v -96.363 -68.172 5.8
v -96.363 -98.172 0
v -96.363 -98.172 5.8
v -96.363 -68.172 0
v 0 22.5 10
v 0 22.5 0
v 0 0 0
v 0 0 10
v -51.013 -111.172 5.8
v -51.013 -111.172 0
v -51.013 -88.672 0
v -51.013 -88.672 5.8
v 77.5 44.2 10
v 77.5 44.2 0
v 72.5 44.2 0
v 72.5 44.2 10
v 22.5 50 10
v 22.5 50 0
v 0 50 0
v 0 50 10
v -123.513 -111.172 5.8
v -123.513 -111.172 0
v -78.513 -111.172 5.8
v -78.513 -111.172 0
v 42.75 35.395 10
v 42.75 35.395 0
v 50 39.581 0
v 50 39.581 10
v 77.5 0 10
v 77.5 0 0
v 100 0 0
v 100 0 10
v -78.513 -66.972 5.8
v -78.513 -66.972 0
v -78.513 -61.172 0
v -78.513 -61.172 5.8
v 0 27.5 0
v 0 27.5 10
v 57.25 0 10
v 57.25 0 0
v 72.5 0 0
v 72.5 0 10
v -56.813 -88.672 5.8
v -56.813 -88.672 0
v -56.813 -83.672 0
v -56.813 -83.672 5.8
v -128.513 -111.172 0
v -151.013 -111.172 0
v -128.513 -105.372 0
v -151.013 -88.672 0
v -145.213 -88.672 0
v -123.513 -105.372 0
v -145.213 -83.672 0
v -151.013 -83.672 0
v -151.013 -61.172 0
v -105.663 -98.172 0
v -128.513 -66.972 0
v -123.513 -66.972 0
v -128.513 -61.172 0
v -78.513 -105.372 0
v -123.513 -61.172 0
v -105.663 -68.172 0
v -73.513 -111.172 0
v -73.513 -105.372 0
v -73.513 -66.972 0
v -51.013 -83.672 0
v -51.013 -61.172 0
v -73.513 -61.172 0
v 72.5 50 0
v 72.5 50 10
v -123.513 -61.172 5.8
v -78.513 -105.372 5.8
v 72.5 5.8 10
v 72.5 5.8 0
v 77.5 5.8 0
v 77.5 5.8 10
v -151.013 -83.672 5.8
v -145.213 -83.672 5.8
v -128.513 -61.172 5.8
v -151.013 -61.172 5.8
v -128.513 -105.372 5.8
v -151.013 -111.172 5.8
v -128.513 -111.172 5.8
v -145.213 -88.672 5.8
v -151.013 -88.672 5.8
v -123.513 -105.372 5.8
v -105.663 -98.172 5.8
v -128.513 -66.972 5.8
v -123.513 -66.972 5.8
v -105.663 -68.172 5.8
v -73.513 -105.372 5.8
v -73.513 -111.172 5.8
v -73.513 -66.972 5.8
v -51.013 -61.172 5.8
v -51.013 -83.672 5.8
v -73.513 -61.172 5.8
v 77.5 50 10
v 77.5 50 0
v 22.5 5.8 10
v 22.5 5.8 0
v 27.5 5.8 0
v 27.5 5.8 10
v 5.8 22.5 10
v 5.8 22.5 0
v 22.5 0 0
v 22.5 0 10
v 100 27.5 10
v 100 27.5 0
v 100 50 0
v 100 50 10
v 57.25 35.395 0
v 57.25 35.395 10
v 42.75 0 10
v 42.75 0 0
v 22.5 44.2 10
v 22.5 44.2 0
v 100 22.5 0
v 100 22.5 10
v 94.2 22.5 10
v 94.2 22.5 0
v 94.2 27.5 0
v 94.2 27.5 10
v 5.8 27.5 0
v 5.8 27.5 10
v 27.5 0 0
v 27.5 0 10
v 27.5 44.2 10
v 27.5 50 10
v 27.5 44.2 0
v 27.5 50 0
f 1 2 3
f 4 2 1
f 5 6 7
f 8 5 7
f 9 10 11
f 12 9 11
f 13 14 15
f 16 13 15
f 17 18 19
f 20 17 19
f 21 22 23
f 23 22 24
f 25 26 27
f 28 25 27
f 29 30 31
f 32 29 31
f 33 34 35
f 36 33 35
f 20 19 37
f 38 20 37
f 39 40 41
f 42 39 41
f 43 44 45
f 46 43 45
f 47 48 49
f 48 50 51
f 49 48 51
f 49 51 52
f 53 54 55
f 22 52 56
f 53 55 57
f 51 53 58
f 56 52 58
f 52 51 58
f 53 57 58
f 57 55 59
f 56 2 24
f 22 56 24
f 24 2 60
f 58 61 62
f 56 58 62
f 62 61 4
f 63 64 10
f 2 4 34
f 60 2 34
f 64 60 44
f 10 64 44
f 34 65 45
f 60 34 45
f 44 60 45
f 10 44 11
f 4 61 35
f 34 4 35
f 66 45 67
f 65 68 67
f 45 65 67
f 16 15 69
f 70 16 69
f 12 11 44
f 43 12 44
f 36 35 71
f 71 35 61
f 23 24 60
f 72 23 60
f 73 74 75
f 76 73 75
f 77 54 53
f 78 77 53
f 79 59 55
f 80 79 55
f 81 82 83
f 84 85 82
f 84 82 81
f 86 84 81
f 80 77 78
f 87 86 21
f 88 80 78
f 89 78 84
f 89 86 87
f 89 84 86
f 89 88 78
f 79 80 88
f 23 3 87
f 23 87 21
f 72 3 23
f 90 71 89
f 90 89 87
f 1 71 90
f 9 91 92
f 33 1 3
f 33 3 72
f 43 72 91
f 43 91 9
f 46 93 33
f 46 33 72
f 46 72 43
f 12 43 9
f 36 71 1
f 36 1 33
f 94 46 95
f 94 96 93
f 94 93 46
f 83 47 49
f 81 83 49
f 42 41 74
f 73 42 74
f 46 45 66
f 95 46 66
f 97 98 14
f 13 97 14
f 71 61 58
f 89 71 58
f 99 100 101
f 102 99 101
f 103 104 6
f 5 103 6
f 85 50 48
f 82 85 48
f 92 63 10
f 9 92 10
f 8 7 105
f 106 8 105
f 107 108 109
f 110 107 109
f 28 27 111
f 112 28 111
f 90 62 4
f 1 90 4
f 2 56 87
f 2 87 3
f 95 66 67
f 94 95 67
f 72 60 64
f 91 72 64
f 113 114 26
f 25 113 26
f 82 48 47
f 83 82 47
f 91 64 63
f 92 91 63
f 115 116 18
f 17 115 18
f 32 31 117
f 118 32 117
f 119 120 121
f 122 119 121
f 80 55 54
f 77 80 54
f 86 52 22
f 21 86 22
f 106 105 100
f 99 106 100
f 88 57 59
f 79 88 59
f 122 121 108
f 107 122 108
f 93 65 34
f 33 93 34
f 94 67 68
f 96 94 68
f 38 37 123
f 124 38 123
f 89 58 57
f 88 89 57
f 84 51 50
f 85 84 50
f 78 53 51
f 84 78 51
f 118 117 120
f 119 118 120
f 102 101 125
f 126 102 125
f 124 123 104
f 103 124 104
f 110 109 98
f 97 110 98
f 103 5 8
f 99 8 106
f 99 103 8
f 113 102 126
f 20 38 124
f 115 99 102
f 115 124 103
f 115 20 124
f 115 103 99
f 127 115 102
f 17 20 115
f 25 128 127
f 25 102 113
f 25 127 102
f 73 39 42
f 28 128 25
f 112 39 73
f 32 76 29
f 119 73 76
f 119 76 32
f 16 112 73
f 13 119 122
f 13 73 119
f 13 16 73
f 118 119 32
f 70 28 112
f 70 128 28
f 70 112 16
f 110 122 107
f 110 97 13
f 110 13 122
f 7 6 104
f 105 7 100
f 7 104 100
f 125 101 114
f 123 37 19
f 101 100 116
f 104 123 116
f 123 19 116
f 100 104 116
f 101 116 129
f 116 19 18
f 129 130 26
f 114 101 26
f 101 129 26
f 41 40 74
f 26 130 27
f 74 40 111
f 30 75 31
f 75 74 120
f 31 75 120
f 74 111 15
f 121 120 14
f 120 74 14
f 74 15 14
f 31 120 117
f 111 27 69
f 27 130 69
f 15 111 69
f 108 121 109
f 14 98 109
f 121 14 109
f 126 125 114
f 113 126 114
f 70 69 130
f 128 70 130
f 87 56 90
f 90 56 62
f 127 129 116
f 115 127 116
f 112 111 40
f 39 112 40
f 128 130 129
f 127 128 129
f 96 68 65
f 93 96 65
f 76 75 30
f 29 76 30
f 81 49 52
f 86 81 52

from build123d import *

# Parameters (mm, degrees)
F2_DEPTH = 10
F3_W     = 9.3
F3_H     = 30
F4_DEPTH = 5.8


with BuildPart() as f2:
    # F1 (on Top) → F2 (new body)
    with BuildSketch(Plane.XY):
        Polygon((0, 22.5), (0, 0), (22.5, 0), (22.5, 5.8), (27.5, 5.8), (27.5, 0), (42.75, 0), (42.75, 35.3950038552), (50, 39.5807933069), (57.25, 35.3950038552), (57.25, 0), (72.5, 0), (72.5, 5.8), (77.5, 5.8), (77.5, 0), (100, 0), (100, 22.5), (94.2, 22.5), (94.2, 27.5), (100, 27.5), (100, 50), (77.5, 50), (77.5, 44.2), (72.5, 44.2), (72.5, 50), (27.5, 50), (27.5, 44.2), (22.5, 44.2), (22.5, 50), (0, 50), (0, 27.5), (5.8, 27.5), (5.8, 22.5), align=None)
    extrude(amount=F2_DEPTH)


with BuildPart() as f4:
    # F3 (on Top) → F4 (new body)
    with BuildSketch(Plane.XY):
        Polygon((-151.0126439095, -88.6723635435), (-151.0126439095, -111.1723635435), (-128.5126439095, -111.1723635435), (-128.5126439095, -105.3723635435), (-123.5126439095, -105.3723635435), (-123.5126439095, -111.1723635435), (-113.4568698463, -111.1723635435), (-88.5684179726, -111.1723635435), (-78.5126439095, -111.1723635435), (-78.5126439095, -105.3723635435), (-73.5126439095, -105.3723635435), (-73.5126439095, -111.1723635435), (-51.0126439095, -111.1723635435), (-51.0126439095, -88.6723635435), (-56.8126439095, -88.6723635435), (-56.8126439095, -83.6723635435), (-51.0126439095, -83.6723635435), (-51.0126439095, -61.1723635435), (-73.5126439095, -61.1723635435), (-73.5126439095, -66.9723635435), (-78.5126439095, -66.9723635435), (-78.5126439095, -61.1723635435), (-123.5126439095, -61.1723635435), (-123.5126439095, -66.9723635435), (-128.5126439095, -66.9723635435), (-128.5126439095, -61.1723635435), (-151.0126439095, -61.1723635435), (-151.0126439095, -83.6723635435), (-145.2126439095, -83.6723635435), (-145.2126439095, -88.6723635435), align=None)
        with Locations((-101.0126439095, -83.1723635435)):
            Rectangle(F3_W, F3_H, mode=Mode.SUBTRACT)
    extrude(amount=F4_DEPTH)


solid = Compound([f2.part, f4.part])
